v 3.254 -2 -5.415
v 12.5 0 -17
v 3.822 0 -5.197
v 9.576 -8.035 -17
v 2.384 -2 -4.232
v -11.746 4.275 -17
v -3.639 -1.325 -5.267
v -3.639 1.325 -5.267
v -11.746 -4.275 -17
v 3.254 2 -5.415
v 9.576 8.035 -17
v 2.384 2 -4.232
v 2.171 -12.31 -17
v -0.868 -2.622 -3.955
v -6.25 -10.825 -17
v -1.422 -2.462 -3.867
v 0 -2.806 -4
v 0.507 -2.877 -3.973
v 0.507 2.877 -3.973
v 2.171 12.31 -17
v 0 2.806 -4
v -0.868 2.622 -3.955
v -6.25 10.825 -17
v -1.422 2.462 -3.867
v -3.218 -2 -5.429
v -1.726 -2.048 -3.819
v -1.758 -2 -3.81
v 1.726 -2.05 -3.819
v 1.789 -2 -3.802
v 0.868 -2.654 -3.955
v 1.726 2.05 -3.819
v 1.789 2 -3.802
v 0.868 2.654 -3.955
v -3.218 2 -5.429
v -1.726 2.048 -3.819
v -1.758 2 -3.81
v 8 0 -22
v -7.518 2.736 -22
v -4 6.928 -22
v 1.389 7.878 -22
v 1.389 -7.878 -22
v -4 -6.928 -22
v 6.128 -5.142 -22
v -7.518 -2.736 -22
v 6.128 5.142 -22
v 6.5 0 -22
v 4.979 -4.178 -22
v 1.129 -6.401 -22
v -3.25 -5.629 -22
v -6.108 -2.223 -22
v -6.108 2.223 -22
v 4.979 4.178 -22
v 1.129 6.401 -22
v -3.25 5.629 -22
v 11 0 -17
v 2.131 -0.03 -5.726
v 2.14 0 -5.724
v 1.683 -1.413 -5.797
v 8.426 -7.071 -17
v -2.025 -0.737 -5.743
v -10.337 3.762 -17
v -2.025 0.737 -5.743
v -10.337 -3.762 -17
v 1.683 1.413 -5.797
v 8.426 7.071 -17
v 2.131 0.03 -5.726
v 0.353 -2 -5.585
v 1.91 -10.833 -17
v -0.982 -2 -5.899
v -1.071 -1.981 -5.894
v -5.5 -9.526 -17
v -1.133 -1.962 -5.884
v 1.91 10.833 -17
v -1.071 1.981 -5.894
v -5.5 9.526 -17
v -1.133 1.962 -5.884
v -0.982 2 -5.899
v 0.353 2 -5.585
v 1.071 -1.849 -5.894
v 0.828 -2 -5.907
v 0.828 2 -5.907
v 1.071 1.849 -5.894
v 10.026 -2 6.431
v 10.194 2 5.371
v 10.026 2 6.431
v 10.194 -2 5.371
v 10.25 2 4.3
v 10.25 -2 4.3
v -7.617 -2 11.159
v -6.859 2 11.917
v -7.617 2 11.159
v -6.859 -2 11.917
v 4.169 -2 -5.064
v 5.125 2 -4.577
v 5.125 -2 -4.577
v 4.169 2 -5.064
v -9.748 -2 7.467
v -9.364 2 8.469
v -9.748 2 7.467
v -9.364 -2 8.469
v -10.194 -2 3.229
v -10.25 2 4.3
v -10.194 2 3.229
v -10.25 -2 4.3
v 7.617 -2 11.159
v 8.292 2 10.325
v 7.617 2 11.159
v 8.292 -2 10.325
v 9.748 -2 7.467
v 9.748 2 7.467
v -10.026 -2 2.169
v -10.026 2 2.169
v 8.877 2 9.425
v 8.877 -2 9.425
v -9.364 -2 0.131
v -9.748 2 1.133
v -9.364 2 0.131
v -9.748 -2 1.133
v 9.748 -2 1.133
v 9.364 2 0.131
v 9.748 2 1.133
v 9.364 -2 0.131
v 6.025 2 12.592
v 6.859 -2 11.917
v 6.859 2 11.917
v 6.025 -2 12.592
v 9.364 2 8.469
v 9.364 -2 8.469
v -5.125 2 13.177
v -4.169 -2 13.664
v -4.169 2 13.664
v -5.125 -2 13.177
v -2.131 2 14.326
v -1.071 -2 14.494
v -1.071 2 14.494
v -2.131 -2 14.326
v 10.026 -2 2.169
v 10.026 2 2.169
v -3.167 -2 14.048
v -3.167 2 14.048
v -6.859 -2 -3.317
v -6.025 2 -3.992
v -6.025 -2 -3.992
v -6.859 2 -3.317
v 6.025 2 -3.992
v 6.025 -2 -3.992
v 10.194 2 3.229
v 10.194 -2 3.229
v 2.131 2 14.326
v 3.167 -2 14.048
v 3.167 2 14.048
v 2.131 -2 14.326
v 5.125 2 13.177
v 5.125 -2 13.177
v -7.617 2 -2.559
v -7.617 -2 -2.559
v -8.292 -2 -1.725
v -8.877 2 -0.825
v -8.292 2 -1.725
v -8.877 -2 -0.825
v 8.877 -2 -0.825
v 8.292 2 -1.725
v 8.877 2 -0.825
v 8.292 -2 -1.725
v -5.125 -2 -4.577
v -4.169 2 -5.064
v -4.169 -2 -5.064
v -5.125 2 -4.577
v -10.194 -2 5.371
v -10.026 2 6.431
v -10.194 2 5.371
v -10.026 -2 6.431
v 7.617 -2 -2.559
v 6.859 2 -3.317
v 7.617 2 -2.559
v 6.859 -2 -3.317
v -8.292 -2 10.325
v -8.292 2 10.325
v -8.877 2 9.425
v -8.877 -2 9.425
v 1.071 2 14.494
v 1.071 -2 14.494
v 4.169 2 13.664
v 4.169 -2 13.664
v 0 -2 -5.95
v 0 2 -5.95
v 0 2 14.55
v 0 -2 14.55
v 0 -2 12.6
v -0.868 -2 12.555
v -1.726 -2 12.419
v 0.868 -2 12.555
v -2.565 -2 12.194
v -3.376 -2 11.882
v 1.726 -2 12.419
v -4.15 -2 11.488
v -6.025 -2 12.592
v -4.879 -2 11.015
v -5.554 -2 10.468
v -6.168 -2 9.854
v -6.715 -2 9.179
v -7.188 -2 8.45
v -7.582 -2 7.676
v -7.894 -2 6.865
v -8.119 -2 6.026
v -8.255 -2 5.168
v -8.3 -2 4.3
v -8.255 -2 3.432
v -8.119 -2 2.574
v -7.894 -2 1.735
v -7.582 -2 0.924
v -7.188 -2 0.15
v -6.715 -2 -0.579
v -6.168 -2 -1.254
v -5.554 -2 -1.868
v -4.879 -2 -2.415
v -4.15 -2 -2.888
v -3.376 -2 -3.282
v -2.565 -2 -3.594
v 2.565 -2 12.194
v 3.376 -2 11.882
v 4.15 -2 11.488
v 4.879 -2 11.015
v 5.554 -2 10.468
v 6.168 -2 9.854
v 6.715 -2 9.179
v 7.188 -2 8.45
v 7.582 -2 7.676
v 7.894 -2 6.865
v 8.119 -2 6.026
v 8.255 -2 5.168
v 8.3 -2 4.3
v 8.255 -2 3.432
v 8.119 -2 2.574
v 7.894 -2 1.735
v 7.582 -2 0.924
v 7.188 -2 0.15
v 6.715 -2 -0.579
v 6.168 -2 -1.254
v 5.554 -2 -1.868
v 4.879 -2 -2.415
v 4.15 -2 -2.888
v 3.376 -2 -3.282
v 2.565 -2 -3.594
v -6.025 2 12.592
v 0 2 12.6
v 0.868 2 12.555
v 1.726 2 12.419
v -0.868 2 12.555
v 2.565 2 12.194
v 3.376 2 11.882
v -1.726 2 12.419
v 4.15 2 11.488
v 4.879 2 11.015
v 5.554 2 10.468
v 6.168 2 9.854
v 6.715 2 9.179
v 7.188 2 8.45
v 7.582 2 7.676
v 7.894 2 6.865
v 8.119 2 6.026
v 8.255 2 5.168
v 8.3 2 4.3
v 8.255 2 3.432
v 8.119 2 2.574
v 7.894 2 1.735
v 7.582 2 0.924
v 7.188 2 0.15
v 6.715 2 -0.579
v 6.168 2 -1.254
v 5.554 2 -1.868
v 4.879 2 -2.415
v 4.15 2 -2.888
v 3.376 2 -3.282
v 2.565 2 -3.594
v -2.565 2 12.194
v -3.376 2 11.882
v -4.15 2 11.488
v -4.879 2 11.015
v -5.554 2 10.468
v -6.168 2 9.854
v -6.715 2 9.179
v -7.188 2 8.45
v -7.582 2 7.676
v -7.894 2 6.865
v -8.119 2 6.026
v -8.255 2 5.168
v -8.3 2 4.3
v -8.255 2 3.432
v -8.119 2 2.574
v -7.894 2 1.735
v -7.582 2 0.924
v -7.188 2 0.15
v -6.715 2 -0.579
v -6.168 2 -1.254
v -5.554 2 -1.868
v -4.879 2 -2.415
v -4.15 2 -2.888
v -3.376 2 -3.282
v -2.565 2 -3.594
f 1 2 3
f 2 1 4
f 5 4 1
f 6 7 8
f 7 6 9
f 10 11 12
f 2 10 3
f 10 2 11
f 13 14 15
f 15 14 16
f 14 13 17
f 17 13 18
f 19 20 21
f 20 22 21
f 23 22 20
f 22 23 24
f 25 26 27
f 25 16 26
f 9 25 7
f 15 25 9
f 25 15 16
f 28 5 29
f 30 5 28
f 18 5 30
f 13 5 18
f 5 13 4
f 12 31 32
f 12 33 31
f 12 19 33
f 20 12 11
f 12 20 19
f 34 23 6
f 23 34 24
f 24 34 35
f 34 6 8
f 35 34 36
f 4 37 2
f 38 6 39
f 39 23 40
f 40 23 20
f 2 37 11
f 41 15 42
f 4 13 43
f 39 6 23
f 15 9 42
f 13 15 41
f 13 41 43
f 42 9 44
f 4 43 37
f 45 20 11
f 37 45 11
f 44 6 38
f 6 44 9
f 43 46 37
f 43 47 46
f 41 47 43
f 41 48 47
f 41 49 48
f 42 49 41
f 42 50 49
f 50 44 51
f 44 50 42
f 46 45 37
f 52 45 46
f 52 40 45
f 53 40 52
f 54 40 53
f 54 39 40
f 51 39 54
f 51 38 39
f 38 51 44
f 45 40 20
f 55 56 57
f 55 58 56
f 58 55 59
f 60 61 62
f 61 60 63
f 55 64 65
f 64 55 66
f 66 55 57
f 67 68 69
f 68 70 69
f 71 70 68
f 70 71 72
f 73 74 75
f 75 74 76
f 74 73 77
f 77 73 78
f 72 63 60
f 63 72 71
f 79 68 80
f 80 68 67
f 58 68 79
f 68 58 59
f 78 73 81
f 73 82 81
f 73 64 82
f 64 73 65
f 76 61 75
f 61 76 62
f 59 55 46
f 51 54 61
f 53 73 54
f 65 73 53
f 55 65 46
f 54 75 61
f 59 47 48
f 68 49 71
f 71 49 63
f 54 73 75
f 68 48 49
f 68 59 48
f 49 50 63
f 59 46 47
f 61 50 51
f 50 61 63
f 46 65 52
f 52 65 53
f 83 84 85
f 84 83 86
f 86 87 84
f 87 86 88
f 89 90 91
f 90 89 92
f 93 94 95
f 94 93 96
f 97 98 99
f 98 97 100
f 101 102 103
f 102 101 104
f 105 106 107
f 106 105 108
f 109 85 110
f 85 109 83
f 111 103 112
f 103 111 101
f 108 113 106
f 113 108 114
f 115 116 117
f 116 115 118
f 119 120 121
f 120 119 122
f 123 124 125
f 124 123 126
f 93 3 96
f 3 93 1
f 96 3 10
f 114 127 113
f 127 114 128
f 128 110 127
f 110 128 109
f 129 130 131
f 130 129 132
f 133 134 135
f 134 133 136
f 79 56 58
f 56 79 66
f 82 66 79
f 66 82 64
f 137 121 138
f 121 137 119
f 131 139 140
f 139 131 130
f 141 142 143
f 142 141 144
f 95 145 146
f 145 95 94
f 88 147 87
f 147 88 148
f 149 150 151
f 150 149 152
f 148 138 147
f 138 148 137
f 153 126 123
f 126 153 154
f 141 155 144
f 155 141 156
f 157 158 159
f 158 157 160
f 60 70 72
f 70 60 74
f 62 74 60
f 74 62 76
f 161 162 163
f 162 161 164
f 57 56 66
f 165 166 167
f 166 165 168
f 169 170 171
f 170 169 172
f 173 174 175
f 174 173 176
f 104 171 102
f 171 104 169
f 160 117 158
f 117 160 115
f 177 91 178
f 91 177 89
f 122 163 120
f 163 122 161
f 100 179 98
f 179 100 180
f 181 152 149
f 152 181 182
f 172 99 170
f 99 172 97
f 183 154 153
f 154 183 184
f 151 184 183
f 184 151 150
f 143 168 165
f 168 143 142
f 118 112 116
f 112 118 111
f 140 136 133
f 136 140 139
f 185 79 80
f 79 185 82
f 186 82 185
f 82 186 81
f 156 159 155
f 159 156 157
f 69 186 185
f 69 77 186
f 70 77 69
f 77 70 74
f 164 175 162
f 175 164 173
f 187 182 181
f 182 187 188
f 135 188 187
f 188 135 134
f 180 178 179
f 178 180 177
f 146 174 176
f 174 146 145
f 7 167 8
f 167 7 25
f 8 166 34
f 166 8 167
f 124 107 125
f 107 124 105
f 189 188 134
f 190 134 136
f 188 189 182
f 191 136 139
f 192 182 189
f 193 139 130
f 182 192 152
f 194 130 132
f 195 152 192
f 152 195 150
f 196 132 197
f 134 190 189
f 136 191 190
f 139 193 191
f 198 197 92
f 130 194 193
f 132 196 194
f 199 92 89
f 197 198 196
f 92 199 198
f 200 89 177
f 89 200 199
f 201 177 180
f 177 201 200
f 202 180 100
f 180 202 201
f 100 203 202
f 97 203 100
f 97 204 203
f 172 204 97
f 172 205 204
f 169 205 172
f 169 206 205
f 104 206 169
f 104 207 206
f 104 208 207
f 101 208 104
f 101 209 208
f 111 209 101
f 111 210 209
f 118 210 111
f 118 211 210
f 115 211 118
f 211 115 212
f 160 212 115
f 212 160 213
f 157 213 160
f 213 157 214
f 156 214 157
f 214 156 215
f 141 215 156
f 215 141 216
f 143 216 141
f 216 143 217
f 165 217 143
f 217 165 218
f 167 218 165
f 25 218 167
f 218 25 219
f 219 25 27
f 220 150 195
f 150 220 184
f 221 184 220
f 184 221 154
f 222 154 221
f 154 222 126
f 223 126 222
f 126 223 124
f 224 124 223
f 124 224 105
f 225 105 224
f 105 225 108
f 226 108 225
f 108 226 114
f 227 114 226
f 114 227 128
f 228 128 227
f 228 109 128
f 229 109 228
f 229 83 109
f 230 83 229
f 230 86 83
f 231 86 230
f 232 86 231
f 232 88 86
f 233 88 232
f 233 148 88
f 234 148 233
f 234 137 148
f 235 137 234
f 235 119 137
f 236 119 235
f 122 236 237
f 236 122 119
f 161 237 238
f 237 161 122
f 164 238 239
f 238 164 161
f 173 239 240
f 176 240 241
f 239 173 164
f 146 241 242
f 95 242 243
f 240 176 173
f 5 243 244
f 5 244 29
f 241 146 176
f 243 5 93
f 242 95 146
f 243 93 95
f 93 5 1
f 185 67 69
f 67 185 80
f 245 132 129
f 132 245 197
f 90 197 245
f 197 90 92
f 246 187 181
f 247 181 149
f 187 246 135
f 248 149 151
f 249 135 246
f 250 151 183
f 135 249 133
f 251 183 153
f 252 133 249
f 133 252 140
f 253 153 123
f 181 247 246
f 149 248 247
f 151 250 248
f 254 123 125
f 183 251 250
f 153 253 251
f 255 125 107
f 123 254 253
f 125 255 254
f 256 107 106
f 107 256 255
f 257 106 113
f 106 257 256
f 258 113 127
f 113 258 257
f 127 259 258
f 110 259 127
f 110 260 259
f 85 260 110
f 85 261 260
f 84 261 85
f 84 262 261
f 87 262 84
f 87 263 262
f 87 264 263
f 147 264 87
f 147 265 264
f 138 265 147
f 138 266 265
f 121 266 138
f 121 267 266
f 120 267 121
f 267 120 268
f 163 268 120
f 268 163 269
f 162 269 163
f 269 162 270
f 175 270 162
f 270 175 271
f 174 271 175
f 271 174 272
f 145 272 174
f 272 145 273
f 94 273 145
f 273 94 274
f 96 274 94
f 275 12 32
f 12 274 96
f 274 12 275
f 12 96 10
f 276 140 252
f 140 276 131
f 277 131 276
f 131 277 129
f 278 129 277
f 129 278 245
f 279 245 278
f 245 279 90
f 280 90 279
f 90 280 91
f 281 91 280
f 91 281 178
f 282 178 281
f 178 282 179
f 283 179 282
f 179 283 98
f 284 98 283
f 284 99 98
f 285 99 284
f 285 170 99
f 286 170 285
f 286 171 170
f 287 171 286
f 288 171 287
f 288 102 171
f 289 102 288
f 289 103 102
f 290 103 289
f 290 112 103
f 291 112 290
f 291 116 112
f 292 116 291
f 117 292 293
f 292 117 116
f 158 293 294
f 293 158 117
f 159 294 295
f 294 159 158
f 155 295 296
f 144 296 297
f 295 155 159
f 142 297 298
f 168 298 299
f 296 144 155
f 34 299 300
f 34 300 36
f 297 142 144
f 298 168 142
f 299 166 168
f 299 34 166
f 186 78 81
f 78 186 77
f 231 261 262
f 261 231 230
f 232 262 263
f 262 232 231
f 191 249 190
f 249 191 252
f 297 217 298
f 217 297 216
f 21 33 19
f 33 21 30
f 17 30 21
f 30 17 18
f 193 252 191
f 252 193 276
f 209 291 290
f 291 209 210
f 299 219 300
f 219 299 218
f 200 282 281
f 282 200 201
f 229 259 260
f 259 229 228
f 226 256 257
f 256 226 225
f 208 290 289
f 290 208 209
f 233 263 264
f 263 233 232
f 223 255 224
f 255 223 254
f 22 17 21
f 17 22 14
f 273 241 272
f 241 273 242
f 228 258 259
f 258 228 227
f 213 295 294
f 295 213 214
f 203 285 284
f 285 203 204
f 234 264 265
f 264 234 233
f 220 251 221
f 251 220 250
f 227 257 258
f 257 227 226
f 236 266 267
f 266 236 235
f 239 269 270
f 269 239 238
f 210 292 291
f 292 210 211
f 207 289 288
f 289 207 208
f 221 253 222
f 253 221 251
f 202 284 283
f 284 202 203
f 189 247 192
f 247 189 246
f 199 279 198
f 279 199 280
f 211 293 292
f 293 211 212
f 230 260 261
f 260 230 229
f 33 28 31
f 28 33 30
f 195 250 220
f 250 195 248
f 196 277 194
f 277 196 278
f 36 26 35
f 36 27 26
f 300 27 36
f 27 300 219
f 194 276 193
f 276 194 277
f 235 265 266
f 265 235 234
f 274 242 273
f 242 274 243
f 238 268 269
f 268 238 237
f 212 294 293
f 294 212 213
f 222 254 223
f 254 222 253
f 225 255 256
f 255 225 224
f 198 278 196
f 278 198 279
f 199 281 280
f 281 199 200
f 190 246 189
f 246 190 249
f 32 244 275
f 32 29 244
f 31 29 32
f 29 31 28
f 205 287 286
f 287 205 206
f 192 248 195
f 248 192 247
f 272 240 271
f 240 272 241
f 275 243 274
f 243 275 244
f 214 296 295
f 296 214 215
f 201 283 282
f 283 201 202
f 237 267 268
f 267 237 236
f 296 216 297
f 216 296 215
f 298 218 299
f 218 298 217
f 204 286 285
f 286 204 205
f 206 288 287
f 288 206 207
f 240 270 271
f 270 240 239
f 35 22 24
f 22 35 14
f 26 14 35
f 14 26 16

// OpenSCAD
// Internal diameter of ring (in mm).
internal_diameter = 16.6;
$fn=60 * 1;

module diamond(w, w2, h1, h2) {
    $fn=9;
    cylinder(d1=0, d2=w, h=h1);
    translate([0, 0, h1]) cylinder(d1=w, d2=w2, h=h2);
}

module dvase(w, w2, h1, h2) {
    difference() {
            diamond(w, w2, h1, h2);
            translate([0, 0, 3]) diamond(w-3, w2-3, h1-3, h2);
            translate([0, 0, h1-.1]) cylinder(d=w2-4, h=h2+1);
    }
}

module ring(id) {
    off = (id / 2) - 4;
    difference() {
        union() {
            rotate([180, 0, 0]) dvase(25, 16, 17, 5);
            translate([0, 0, off]) rotate([90, 0, 0])cylinder(d=id+3.9, h=4, center=true);
        }
        translate([0, 0, off]) rotate([90, 0, 0]) cylinder(d=id, h=25, center=true);
    }
}

ring(internal_diameter);
